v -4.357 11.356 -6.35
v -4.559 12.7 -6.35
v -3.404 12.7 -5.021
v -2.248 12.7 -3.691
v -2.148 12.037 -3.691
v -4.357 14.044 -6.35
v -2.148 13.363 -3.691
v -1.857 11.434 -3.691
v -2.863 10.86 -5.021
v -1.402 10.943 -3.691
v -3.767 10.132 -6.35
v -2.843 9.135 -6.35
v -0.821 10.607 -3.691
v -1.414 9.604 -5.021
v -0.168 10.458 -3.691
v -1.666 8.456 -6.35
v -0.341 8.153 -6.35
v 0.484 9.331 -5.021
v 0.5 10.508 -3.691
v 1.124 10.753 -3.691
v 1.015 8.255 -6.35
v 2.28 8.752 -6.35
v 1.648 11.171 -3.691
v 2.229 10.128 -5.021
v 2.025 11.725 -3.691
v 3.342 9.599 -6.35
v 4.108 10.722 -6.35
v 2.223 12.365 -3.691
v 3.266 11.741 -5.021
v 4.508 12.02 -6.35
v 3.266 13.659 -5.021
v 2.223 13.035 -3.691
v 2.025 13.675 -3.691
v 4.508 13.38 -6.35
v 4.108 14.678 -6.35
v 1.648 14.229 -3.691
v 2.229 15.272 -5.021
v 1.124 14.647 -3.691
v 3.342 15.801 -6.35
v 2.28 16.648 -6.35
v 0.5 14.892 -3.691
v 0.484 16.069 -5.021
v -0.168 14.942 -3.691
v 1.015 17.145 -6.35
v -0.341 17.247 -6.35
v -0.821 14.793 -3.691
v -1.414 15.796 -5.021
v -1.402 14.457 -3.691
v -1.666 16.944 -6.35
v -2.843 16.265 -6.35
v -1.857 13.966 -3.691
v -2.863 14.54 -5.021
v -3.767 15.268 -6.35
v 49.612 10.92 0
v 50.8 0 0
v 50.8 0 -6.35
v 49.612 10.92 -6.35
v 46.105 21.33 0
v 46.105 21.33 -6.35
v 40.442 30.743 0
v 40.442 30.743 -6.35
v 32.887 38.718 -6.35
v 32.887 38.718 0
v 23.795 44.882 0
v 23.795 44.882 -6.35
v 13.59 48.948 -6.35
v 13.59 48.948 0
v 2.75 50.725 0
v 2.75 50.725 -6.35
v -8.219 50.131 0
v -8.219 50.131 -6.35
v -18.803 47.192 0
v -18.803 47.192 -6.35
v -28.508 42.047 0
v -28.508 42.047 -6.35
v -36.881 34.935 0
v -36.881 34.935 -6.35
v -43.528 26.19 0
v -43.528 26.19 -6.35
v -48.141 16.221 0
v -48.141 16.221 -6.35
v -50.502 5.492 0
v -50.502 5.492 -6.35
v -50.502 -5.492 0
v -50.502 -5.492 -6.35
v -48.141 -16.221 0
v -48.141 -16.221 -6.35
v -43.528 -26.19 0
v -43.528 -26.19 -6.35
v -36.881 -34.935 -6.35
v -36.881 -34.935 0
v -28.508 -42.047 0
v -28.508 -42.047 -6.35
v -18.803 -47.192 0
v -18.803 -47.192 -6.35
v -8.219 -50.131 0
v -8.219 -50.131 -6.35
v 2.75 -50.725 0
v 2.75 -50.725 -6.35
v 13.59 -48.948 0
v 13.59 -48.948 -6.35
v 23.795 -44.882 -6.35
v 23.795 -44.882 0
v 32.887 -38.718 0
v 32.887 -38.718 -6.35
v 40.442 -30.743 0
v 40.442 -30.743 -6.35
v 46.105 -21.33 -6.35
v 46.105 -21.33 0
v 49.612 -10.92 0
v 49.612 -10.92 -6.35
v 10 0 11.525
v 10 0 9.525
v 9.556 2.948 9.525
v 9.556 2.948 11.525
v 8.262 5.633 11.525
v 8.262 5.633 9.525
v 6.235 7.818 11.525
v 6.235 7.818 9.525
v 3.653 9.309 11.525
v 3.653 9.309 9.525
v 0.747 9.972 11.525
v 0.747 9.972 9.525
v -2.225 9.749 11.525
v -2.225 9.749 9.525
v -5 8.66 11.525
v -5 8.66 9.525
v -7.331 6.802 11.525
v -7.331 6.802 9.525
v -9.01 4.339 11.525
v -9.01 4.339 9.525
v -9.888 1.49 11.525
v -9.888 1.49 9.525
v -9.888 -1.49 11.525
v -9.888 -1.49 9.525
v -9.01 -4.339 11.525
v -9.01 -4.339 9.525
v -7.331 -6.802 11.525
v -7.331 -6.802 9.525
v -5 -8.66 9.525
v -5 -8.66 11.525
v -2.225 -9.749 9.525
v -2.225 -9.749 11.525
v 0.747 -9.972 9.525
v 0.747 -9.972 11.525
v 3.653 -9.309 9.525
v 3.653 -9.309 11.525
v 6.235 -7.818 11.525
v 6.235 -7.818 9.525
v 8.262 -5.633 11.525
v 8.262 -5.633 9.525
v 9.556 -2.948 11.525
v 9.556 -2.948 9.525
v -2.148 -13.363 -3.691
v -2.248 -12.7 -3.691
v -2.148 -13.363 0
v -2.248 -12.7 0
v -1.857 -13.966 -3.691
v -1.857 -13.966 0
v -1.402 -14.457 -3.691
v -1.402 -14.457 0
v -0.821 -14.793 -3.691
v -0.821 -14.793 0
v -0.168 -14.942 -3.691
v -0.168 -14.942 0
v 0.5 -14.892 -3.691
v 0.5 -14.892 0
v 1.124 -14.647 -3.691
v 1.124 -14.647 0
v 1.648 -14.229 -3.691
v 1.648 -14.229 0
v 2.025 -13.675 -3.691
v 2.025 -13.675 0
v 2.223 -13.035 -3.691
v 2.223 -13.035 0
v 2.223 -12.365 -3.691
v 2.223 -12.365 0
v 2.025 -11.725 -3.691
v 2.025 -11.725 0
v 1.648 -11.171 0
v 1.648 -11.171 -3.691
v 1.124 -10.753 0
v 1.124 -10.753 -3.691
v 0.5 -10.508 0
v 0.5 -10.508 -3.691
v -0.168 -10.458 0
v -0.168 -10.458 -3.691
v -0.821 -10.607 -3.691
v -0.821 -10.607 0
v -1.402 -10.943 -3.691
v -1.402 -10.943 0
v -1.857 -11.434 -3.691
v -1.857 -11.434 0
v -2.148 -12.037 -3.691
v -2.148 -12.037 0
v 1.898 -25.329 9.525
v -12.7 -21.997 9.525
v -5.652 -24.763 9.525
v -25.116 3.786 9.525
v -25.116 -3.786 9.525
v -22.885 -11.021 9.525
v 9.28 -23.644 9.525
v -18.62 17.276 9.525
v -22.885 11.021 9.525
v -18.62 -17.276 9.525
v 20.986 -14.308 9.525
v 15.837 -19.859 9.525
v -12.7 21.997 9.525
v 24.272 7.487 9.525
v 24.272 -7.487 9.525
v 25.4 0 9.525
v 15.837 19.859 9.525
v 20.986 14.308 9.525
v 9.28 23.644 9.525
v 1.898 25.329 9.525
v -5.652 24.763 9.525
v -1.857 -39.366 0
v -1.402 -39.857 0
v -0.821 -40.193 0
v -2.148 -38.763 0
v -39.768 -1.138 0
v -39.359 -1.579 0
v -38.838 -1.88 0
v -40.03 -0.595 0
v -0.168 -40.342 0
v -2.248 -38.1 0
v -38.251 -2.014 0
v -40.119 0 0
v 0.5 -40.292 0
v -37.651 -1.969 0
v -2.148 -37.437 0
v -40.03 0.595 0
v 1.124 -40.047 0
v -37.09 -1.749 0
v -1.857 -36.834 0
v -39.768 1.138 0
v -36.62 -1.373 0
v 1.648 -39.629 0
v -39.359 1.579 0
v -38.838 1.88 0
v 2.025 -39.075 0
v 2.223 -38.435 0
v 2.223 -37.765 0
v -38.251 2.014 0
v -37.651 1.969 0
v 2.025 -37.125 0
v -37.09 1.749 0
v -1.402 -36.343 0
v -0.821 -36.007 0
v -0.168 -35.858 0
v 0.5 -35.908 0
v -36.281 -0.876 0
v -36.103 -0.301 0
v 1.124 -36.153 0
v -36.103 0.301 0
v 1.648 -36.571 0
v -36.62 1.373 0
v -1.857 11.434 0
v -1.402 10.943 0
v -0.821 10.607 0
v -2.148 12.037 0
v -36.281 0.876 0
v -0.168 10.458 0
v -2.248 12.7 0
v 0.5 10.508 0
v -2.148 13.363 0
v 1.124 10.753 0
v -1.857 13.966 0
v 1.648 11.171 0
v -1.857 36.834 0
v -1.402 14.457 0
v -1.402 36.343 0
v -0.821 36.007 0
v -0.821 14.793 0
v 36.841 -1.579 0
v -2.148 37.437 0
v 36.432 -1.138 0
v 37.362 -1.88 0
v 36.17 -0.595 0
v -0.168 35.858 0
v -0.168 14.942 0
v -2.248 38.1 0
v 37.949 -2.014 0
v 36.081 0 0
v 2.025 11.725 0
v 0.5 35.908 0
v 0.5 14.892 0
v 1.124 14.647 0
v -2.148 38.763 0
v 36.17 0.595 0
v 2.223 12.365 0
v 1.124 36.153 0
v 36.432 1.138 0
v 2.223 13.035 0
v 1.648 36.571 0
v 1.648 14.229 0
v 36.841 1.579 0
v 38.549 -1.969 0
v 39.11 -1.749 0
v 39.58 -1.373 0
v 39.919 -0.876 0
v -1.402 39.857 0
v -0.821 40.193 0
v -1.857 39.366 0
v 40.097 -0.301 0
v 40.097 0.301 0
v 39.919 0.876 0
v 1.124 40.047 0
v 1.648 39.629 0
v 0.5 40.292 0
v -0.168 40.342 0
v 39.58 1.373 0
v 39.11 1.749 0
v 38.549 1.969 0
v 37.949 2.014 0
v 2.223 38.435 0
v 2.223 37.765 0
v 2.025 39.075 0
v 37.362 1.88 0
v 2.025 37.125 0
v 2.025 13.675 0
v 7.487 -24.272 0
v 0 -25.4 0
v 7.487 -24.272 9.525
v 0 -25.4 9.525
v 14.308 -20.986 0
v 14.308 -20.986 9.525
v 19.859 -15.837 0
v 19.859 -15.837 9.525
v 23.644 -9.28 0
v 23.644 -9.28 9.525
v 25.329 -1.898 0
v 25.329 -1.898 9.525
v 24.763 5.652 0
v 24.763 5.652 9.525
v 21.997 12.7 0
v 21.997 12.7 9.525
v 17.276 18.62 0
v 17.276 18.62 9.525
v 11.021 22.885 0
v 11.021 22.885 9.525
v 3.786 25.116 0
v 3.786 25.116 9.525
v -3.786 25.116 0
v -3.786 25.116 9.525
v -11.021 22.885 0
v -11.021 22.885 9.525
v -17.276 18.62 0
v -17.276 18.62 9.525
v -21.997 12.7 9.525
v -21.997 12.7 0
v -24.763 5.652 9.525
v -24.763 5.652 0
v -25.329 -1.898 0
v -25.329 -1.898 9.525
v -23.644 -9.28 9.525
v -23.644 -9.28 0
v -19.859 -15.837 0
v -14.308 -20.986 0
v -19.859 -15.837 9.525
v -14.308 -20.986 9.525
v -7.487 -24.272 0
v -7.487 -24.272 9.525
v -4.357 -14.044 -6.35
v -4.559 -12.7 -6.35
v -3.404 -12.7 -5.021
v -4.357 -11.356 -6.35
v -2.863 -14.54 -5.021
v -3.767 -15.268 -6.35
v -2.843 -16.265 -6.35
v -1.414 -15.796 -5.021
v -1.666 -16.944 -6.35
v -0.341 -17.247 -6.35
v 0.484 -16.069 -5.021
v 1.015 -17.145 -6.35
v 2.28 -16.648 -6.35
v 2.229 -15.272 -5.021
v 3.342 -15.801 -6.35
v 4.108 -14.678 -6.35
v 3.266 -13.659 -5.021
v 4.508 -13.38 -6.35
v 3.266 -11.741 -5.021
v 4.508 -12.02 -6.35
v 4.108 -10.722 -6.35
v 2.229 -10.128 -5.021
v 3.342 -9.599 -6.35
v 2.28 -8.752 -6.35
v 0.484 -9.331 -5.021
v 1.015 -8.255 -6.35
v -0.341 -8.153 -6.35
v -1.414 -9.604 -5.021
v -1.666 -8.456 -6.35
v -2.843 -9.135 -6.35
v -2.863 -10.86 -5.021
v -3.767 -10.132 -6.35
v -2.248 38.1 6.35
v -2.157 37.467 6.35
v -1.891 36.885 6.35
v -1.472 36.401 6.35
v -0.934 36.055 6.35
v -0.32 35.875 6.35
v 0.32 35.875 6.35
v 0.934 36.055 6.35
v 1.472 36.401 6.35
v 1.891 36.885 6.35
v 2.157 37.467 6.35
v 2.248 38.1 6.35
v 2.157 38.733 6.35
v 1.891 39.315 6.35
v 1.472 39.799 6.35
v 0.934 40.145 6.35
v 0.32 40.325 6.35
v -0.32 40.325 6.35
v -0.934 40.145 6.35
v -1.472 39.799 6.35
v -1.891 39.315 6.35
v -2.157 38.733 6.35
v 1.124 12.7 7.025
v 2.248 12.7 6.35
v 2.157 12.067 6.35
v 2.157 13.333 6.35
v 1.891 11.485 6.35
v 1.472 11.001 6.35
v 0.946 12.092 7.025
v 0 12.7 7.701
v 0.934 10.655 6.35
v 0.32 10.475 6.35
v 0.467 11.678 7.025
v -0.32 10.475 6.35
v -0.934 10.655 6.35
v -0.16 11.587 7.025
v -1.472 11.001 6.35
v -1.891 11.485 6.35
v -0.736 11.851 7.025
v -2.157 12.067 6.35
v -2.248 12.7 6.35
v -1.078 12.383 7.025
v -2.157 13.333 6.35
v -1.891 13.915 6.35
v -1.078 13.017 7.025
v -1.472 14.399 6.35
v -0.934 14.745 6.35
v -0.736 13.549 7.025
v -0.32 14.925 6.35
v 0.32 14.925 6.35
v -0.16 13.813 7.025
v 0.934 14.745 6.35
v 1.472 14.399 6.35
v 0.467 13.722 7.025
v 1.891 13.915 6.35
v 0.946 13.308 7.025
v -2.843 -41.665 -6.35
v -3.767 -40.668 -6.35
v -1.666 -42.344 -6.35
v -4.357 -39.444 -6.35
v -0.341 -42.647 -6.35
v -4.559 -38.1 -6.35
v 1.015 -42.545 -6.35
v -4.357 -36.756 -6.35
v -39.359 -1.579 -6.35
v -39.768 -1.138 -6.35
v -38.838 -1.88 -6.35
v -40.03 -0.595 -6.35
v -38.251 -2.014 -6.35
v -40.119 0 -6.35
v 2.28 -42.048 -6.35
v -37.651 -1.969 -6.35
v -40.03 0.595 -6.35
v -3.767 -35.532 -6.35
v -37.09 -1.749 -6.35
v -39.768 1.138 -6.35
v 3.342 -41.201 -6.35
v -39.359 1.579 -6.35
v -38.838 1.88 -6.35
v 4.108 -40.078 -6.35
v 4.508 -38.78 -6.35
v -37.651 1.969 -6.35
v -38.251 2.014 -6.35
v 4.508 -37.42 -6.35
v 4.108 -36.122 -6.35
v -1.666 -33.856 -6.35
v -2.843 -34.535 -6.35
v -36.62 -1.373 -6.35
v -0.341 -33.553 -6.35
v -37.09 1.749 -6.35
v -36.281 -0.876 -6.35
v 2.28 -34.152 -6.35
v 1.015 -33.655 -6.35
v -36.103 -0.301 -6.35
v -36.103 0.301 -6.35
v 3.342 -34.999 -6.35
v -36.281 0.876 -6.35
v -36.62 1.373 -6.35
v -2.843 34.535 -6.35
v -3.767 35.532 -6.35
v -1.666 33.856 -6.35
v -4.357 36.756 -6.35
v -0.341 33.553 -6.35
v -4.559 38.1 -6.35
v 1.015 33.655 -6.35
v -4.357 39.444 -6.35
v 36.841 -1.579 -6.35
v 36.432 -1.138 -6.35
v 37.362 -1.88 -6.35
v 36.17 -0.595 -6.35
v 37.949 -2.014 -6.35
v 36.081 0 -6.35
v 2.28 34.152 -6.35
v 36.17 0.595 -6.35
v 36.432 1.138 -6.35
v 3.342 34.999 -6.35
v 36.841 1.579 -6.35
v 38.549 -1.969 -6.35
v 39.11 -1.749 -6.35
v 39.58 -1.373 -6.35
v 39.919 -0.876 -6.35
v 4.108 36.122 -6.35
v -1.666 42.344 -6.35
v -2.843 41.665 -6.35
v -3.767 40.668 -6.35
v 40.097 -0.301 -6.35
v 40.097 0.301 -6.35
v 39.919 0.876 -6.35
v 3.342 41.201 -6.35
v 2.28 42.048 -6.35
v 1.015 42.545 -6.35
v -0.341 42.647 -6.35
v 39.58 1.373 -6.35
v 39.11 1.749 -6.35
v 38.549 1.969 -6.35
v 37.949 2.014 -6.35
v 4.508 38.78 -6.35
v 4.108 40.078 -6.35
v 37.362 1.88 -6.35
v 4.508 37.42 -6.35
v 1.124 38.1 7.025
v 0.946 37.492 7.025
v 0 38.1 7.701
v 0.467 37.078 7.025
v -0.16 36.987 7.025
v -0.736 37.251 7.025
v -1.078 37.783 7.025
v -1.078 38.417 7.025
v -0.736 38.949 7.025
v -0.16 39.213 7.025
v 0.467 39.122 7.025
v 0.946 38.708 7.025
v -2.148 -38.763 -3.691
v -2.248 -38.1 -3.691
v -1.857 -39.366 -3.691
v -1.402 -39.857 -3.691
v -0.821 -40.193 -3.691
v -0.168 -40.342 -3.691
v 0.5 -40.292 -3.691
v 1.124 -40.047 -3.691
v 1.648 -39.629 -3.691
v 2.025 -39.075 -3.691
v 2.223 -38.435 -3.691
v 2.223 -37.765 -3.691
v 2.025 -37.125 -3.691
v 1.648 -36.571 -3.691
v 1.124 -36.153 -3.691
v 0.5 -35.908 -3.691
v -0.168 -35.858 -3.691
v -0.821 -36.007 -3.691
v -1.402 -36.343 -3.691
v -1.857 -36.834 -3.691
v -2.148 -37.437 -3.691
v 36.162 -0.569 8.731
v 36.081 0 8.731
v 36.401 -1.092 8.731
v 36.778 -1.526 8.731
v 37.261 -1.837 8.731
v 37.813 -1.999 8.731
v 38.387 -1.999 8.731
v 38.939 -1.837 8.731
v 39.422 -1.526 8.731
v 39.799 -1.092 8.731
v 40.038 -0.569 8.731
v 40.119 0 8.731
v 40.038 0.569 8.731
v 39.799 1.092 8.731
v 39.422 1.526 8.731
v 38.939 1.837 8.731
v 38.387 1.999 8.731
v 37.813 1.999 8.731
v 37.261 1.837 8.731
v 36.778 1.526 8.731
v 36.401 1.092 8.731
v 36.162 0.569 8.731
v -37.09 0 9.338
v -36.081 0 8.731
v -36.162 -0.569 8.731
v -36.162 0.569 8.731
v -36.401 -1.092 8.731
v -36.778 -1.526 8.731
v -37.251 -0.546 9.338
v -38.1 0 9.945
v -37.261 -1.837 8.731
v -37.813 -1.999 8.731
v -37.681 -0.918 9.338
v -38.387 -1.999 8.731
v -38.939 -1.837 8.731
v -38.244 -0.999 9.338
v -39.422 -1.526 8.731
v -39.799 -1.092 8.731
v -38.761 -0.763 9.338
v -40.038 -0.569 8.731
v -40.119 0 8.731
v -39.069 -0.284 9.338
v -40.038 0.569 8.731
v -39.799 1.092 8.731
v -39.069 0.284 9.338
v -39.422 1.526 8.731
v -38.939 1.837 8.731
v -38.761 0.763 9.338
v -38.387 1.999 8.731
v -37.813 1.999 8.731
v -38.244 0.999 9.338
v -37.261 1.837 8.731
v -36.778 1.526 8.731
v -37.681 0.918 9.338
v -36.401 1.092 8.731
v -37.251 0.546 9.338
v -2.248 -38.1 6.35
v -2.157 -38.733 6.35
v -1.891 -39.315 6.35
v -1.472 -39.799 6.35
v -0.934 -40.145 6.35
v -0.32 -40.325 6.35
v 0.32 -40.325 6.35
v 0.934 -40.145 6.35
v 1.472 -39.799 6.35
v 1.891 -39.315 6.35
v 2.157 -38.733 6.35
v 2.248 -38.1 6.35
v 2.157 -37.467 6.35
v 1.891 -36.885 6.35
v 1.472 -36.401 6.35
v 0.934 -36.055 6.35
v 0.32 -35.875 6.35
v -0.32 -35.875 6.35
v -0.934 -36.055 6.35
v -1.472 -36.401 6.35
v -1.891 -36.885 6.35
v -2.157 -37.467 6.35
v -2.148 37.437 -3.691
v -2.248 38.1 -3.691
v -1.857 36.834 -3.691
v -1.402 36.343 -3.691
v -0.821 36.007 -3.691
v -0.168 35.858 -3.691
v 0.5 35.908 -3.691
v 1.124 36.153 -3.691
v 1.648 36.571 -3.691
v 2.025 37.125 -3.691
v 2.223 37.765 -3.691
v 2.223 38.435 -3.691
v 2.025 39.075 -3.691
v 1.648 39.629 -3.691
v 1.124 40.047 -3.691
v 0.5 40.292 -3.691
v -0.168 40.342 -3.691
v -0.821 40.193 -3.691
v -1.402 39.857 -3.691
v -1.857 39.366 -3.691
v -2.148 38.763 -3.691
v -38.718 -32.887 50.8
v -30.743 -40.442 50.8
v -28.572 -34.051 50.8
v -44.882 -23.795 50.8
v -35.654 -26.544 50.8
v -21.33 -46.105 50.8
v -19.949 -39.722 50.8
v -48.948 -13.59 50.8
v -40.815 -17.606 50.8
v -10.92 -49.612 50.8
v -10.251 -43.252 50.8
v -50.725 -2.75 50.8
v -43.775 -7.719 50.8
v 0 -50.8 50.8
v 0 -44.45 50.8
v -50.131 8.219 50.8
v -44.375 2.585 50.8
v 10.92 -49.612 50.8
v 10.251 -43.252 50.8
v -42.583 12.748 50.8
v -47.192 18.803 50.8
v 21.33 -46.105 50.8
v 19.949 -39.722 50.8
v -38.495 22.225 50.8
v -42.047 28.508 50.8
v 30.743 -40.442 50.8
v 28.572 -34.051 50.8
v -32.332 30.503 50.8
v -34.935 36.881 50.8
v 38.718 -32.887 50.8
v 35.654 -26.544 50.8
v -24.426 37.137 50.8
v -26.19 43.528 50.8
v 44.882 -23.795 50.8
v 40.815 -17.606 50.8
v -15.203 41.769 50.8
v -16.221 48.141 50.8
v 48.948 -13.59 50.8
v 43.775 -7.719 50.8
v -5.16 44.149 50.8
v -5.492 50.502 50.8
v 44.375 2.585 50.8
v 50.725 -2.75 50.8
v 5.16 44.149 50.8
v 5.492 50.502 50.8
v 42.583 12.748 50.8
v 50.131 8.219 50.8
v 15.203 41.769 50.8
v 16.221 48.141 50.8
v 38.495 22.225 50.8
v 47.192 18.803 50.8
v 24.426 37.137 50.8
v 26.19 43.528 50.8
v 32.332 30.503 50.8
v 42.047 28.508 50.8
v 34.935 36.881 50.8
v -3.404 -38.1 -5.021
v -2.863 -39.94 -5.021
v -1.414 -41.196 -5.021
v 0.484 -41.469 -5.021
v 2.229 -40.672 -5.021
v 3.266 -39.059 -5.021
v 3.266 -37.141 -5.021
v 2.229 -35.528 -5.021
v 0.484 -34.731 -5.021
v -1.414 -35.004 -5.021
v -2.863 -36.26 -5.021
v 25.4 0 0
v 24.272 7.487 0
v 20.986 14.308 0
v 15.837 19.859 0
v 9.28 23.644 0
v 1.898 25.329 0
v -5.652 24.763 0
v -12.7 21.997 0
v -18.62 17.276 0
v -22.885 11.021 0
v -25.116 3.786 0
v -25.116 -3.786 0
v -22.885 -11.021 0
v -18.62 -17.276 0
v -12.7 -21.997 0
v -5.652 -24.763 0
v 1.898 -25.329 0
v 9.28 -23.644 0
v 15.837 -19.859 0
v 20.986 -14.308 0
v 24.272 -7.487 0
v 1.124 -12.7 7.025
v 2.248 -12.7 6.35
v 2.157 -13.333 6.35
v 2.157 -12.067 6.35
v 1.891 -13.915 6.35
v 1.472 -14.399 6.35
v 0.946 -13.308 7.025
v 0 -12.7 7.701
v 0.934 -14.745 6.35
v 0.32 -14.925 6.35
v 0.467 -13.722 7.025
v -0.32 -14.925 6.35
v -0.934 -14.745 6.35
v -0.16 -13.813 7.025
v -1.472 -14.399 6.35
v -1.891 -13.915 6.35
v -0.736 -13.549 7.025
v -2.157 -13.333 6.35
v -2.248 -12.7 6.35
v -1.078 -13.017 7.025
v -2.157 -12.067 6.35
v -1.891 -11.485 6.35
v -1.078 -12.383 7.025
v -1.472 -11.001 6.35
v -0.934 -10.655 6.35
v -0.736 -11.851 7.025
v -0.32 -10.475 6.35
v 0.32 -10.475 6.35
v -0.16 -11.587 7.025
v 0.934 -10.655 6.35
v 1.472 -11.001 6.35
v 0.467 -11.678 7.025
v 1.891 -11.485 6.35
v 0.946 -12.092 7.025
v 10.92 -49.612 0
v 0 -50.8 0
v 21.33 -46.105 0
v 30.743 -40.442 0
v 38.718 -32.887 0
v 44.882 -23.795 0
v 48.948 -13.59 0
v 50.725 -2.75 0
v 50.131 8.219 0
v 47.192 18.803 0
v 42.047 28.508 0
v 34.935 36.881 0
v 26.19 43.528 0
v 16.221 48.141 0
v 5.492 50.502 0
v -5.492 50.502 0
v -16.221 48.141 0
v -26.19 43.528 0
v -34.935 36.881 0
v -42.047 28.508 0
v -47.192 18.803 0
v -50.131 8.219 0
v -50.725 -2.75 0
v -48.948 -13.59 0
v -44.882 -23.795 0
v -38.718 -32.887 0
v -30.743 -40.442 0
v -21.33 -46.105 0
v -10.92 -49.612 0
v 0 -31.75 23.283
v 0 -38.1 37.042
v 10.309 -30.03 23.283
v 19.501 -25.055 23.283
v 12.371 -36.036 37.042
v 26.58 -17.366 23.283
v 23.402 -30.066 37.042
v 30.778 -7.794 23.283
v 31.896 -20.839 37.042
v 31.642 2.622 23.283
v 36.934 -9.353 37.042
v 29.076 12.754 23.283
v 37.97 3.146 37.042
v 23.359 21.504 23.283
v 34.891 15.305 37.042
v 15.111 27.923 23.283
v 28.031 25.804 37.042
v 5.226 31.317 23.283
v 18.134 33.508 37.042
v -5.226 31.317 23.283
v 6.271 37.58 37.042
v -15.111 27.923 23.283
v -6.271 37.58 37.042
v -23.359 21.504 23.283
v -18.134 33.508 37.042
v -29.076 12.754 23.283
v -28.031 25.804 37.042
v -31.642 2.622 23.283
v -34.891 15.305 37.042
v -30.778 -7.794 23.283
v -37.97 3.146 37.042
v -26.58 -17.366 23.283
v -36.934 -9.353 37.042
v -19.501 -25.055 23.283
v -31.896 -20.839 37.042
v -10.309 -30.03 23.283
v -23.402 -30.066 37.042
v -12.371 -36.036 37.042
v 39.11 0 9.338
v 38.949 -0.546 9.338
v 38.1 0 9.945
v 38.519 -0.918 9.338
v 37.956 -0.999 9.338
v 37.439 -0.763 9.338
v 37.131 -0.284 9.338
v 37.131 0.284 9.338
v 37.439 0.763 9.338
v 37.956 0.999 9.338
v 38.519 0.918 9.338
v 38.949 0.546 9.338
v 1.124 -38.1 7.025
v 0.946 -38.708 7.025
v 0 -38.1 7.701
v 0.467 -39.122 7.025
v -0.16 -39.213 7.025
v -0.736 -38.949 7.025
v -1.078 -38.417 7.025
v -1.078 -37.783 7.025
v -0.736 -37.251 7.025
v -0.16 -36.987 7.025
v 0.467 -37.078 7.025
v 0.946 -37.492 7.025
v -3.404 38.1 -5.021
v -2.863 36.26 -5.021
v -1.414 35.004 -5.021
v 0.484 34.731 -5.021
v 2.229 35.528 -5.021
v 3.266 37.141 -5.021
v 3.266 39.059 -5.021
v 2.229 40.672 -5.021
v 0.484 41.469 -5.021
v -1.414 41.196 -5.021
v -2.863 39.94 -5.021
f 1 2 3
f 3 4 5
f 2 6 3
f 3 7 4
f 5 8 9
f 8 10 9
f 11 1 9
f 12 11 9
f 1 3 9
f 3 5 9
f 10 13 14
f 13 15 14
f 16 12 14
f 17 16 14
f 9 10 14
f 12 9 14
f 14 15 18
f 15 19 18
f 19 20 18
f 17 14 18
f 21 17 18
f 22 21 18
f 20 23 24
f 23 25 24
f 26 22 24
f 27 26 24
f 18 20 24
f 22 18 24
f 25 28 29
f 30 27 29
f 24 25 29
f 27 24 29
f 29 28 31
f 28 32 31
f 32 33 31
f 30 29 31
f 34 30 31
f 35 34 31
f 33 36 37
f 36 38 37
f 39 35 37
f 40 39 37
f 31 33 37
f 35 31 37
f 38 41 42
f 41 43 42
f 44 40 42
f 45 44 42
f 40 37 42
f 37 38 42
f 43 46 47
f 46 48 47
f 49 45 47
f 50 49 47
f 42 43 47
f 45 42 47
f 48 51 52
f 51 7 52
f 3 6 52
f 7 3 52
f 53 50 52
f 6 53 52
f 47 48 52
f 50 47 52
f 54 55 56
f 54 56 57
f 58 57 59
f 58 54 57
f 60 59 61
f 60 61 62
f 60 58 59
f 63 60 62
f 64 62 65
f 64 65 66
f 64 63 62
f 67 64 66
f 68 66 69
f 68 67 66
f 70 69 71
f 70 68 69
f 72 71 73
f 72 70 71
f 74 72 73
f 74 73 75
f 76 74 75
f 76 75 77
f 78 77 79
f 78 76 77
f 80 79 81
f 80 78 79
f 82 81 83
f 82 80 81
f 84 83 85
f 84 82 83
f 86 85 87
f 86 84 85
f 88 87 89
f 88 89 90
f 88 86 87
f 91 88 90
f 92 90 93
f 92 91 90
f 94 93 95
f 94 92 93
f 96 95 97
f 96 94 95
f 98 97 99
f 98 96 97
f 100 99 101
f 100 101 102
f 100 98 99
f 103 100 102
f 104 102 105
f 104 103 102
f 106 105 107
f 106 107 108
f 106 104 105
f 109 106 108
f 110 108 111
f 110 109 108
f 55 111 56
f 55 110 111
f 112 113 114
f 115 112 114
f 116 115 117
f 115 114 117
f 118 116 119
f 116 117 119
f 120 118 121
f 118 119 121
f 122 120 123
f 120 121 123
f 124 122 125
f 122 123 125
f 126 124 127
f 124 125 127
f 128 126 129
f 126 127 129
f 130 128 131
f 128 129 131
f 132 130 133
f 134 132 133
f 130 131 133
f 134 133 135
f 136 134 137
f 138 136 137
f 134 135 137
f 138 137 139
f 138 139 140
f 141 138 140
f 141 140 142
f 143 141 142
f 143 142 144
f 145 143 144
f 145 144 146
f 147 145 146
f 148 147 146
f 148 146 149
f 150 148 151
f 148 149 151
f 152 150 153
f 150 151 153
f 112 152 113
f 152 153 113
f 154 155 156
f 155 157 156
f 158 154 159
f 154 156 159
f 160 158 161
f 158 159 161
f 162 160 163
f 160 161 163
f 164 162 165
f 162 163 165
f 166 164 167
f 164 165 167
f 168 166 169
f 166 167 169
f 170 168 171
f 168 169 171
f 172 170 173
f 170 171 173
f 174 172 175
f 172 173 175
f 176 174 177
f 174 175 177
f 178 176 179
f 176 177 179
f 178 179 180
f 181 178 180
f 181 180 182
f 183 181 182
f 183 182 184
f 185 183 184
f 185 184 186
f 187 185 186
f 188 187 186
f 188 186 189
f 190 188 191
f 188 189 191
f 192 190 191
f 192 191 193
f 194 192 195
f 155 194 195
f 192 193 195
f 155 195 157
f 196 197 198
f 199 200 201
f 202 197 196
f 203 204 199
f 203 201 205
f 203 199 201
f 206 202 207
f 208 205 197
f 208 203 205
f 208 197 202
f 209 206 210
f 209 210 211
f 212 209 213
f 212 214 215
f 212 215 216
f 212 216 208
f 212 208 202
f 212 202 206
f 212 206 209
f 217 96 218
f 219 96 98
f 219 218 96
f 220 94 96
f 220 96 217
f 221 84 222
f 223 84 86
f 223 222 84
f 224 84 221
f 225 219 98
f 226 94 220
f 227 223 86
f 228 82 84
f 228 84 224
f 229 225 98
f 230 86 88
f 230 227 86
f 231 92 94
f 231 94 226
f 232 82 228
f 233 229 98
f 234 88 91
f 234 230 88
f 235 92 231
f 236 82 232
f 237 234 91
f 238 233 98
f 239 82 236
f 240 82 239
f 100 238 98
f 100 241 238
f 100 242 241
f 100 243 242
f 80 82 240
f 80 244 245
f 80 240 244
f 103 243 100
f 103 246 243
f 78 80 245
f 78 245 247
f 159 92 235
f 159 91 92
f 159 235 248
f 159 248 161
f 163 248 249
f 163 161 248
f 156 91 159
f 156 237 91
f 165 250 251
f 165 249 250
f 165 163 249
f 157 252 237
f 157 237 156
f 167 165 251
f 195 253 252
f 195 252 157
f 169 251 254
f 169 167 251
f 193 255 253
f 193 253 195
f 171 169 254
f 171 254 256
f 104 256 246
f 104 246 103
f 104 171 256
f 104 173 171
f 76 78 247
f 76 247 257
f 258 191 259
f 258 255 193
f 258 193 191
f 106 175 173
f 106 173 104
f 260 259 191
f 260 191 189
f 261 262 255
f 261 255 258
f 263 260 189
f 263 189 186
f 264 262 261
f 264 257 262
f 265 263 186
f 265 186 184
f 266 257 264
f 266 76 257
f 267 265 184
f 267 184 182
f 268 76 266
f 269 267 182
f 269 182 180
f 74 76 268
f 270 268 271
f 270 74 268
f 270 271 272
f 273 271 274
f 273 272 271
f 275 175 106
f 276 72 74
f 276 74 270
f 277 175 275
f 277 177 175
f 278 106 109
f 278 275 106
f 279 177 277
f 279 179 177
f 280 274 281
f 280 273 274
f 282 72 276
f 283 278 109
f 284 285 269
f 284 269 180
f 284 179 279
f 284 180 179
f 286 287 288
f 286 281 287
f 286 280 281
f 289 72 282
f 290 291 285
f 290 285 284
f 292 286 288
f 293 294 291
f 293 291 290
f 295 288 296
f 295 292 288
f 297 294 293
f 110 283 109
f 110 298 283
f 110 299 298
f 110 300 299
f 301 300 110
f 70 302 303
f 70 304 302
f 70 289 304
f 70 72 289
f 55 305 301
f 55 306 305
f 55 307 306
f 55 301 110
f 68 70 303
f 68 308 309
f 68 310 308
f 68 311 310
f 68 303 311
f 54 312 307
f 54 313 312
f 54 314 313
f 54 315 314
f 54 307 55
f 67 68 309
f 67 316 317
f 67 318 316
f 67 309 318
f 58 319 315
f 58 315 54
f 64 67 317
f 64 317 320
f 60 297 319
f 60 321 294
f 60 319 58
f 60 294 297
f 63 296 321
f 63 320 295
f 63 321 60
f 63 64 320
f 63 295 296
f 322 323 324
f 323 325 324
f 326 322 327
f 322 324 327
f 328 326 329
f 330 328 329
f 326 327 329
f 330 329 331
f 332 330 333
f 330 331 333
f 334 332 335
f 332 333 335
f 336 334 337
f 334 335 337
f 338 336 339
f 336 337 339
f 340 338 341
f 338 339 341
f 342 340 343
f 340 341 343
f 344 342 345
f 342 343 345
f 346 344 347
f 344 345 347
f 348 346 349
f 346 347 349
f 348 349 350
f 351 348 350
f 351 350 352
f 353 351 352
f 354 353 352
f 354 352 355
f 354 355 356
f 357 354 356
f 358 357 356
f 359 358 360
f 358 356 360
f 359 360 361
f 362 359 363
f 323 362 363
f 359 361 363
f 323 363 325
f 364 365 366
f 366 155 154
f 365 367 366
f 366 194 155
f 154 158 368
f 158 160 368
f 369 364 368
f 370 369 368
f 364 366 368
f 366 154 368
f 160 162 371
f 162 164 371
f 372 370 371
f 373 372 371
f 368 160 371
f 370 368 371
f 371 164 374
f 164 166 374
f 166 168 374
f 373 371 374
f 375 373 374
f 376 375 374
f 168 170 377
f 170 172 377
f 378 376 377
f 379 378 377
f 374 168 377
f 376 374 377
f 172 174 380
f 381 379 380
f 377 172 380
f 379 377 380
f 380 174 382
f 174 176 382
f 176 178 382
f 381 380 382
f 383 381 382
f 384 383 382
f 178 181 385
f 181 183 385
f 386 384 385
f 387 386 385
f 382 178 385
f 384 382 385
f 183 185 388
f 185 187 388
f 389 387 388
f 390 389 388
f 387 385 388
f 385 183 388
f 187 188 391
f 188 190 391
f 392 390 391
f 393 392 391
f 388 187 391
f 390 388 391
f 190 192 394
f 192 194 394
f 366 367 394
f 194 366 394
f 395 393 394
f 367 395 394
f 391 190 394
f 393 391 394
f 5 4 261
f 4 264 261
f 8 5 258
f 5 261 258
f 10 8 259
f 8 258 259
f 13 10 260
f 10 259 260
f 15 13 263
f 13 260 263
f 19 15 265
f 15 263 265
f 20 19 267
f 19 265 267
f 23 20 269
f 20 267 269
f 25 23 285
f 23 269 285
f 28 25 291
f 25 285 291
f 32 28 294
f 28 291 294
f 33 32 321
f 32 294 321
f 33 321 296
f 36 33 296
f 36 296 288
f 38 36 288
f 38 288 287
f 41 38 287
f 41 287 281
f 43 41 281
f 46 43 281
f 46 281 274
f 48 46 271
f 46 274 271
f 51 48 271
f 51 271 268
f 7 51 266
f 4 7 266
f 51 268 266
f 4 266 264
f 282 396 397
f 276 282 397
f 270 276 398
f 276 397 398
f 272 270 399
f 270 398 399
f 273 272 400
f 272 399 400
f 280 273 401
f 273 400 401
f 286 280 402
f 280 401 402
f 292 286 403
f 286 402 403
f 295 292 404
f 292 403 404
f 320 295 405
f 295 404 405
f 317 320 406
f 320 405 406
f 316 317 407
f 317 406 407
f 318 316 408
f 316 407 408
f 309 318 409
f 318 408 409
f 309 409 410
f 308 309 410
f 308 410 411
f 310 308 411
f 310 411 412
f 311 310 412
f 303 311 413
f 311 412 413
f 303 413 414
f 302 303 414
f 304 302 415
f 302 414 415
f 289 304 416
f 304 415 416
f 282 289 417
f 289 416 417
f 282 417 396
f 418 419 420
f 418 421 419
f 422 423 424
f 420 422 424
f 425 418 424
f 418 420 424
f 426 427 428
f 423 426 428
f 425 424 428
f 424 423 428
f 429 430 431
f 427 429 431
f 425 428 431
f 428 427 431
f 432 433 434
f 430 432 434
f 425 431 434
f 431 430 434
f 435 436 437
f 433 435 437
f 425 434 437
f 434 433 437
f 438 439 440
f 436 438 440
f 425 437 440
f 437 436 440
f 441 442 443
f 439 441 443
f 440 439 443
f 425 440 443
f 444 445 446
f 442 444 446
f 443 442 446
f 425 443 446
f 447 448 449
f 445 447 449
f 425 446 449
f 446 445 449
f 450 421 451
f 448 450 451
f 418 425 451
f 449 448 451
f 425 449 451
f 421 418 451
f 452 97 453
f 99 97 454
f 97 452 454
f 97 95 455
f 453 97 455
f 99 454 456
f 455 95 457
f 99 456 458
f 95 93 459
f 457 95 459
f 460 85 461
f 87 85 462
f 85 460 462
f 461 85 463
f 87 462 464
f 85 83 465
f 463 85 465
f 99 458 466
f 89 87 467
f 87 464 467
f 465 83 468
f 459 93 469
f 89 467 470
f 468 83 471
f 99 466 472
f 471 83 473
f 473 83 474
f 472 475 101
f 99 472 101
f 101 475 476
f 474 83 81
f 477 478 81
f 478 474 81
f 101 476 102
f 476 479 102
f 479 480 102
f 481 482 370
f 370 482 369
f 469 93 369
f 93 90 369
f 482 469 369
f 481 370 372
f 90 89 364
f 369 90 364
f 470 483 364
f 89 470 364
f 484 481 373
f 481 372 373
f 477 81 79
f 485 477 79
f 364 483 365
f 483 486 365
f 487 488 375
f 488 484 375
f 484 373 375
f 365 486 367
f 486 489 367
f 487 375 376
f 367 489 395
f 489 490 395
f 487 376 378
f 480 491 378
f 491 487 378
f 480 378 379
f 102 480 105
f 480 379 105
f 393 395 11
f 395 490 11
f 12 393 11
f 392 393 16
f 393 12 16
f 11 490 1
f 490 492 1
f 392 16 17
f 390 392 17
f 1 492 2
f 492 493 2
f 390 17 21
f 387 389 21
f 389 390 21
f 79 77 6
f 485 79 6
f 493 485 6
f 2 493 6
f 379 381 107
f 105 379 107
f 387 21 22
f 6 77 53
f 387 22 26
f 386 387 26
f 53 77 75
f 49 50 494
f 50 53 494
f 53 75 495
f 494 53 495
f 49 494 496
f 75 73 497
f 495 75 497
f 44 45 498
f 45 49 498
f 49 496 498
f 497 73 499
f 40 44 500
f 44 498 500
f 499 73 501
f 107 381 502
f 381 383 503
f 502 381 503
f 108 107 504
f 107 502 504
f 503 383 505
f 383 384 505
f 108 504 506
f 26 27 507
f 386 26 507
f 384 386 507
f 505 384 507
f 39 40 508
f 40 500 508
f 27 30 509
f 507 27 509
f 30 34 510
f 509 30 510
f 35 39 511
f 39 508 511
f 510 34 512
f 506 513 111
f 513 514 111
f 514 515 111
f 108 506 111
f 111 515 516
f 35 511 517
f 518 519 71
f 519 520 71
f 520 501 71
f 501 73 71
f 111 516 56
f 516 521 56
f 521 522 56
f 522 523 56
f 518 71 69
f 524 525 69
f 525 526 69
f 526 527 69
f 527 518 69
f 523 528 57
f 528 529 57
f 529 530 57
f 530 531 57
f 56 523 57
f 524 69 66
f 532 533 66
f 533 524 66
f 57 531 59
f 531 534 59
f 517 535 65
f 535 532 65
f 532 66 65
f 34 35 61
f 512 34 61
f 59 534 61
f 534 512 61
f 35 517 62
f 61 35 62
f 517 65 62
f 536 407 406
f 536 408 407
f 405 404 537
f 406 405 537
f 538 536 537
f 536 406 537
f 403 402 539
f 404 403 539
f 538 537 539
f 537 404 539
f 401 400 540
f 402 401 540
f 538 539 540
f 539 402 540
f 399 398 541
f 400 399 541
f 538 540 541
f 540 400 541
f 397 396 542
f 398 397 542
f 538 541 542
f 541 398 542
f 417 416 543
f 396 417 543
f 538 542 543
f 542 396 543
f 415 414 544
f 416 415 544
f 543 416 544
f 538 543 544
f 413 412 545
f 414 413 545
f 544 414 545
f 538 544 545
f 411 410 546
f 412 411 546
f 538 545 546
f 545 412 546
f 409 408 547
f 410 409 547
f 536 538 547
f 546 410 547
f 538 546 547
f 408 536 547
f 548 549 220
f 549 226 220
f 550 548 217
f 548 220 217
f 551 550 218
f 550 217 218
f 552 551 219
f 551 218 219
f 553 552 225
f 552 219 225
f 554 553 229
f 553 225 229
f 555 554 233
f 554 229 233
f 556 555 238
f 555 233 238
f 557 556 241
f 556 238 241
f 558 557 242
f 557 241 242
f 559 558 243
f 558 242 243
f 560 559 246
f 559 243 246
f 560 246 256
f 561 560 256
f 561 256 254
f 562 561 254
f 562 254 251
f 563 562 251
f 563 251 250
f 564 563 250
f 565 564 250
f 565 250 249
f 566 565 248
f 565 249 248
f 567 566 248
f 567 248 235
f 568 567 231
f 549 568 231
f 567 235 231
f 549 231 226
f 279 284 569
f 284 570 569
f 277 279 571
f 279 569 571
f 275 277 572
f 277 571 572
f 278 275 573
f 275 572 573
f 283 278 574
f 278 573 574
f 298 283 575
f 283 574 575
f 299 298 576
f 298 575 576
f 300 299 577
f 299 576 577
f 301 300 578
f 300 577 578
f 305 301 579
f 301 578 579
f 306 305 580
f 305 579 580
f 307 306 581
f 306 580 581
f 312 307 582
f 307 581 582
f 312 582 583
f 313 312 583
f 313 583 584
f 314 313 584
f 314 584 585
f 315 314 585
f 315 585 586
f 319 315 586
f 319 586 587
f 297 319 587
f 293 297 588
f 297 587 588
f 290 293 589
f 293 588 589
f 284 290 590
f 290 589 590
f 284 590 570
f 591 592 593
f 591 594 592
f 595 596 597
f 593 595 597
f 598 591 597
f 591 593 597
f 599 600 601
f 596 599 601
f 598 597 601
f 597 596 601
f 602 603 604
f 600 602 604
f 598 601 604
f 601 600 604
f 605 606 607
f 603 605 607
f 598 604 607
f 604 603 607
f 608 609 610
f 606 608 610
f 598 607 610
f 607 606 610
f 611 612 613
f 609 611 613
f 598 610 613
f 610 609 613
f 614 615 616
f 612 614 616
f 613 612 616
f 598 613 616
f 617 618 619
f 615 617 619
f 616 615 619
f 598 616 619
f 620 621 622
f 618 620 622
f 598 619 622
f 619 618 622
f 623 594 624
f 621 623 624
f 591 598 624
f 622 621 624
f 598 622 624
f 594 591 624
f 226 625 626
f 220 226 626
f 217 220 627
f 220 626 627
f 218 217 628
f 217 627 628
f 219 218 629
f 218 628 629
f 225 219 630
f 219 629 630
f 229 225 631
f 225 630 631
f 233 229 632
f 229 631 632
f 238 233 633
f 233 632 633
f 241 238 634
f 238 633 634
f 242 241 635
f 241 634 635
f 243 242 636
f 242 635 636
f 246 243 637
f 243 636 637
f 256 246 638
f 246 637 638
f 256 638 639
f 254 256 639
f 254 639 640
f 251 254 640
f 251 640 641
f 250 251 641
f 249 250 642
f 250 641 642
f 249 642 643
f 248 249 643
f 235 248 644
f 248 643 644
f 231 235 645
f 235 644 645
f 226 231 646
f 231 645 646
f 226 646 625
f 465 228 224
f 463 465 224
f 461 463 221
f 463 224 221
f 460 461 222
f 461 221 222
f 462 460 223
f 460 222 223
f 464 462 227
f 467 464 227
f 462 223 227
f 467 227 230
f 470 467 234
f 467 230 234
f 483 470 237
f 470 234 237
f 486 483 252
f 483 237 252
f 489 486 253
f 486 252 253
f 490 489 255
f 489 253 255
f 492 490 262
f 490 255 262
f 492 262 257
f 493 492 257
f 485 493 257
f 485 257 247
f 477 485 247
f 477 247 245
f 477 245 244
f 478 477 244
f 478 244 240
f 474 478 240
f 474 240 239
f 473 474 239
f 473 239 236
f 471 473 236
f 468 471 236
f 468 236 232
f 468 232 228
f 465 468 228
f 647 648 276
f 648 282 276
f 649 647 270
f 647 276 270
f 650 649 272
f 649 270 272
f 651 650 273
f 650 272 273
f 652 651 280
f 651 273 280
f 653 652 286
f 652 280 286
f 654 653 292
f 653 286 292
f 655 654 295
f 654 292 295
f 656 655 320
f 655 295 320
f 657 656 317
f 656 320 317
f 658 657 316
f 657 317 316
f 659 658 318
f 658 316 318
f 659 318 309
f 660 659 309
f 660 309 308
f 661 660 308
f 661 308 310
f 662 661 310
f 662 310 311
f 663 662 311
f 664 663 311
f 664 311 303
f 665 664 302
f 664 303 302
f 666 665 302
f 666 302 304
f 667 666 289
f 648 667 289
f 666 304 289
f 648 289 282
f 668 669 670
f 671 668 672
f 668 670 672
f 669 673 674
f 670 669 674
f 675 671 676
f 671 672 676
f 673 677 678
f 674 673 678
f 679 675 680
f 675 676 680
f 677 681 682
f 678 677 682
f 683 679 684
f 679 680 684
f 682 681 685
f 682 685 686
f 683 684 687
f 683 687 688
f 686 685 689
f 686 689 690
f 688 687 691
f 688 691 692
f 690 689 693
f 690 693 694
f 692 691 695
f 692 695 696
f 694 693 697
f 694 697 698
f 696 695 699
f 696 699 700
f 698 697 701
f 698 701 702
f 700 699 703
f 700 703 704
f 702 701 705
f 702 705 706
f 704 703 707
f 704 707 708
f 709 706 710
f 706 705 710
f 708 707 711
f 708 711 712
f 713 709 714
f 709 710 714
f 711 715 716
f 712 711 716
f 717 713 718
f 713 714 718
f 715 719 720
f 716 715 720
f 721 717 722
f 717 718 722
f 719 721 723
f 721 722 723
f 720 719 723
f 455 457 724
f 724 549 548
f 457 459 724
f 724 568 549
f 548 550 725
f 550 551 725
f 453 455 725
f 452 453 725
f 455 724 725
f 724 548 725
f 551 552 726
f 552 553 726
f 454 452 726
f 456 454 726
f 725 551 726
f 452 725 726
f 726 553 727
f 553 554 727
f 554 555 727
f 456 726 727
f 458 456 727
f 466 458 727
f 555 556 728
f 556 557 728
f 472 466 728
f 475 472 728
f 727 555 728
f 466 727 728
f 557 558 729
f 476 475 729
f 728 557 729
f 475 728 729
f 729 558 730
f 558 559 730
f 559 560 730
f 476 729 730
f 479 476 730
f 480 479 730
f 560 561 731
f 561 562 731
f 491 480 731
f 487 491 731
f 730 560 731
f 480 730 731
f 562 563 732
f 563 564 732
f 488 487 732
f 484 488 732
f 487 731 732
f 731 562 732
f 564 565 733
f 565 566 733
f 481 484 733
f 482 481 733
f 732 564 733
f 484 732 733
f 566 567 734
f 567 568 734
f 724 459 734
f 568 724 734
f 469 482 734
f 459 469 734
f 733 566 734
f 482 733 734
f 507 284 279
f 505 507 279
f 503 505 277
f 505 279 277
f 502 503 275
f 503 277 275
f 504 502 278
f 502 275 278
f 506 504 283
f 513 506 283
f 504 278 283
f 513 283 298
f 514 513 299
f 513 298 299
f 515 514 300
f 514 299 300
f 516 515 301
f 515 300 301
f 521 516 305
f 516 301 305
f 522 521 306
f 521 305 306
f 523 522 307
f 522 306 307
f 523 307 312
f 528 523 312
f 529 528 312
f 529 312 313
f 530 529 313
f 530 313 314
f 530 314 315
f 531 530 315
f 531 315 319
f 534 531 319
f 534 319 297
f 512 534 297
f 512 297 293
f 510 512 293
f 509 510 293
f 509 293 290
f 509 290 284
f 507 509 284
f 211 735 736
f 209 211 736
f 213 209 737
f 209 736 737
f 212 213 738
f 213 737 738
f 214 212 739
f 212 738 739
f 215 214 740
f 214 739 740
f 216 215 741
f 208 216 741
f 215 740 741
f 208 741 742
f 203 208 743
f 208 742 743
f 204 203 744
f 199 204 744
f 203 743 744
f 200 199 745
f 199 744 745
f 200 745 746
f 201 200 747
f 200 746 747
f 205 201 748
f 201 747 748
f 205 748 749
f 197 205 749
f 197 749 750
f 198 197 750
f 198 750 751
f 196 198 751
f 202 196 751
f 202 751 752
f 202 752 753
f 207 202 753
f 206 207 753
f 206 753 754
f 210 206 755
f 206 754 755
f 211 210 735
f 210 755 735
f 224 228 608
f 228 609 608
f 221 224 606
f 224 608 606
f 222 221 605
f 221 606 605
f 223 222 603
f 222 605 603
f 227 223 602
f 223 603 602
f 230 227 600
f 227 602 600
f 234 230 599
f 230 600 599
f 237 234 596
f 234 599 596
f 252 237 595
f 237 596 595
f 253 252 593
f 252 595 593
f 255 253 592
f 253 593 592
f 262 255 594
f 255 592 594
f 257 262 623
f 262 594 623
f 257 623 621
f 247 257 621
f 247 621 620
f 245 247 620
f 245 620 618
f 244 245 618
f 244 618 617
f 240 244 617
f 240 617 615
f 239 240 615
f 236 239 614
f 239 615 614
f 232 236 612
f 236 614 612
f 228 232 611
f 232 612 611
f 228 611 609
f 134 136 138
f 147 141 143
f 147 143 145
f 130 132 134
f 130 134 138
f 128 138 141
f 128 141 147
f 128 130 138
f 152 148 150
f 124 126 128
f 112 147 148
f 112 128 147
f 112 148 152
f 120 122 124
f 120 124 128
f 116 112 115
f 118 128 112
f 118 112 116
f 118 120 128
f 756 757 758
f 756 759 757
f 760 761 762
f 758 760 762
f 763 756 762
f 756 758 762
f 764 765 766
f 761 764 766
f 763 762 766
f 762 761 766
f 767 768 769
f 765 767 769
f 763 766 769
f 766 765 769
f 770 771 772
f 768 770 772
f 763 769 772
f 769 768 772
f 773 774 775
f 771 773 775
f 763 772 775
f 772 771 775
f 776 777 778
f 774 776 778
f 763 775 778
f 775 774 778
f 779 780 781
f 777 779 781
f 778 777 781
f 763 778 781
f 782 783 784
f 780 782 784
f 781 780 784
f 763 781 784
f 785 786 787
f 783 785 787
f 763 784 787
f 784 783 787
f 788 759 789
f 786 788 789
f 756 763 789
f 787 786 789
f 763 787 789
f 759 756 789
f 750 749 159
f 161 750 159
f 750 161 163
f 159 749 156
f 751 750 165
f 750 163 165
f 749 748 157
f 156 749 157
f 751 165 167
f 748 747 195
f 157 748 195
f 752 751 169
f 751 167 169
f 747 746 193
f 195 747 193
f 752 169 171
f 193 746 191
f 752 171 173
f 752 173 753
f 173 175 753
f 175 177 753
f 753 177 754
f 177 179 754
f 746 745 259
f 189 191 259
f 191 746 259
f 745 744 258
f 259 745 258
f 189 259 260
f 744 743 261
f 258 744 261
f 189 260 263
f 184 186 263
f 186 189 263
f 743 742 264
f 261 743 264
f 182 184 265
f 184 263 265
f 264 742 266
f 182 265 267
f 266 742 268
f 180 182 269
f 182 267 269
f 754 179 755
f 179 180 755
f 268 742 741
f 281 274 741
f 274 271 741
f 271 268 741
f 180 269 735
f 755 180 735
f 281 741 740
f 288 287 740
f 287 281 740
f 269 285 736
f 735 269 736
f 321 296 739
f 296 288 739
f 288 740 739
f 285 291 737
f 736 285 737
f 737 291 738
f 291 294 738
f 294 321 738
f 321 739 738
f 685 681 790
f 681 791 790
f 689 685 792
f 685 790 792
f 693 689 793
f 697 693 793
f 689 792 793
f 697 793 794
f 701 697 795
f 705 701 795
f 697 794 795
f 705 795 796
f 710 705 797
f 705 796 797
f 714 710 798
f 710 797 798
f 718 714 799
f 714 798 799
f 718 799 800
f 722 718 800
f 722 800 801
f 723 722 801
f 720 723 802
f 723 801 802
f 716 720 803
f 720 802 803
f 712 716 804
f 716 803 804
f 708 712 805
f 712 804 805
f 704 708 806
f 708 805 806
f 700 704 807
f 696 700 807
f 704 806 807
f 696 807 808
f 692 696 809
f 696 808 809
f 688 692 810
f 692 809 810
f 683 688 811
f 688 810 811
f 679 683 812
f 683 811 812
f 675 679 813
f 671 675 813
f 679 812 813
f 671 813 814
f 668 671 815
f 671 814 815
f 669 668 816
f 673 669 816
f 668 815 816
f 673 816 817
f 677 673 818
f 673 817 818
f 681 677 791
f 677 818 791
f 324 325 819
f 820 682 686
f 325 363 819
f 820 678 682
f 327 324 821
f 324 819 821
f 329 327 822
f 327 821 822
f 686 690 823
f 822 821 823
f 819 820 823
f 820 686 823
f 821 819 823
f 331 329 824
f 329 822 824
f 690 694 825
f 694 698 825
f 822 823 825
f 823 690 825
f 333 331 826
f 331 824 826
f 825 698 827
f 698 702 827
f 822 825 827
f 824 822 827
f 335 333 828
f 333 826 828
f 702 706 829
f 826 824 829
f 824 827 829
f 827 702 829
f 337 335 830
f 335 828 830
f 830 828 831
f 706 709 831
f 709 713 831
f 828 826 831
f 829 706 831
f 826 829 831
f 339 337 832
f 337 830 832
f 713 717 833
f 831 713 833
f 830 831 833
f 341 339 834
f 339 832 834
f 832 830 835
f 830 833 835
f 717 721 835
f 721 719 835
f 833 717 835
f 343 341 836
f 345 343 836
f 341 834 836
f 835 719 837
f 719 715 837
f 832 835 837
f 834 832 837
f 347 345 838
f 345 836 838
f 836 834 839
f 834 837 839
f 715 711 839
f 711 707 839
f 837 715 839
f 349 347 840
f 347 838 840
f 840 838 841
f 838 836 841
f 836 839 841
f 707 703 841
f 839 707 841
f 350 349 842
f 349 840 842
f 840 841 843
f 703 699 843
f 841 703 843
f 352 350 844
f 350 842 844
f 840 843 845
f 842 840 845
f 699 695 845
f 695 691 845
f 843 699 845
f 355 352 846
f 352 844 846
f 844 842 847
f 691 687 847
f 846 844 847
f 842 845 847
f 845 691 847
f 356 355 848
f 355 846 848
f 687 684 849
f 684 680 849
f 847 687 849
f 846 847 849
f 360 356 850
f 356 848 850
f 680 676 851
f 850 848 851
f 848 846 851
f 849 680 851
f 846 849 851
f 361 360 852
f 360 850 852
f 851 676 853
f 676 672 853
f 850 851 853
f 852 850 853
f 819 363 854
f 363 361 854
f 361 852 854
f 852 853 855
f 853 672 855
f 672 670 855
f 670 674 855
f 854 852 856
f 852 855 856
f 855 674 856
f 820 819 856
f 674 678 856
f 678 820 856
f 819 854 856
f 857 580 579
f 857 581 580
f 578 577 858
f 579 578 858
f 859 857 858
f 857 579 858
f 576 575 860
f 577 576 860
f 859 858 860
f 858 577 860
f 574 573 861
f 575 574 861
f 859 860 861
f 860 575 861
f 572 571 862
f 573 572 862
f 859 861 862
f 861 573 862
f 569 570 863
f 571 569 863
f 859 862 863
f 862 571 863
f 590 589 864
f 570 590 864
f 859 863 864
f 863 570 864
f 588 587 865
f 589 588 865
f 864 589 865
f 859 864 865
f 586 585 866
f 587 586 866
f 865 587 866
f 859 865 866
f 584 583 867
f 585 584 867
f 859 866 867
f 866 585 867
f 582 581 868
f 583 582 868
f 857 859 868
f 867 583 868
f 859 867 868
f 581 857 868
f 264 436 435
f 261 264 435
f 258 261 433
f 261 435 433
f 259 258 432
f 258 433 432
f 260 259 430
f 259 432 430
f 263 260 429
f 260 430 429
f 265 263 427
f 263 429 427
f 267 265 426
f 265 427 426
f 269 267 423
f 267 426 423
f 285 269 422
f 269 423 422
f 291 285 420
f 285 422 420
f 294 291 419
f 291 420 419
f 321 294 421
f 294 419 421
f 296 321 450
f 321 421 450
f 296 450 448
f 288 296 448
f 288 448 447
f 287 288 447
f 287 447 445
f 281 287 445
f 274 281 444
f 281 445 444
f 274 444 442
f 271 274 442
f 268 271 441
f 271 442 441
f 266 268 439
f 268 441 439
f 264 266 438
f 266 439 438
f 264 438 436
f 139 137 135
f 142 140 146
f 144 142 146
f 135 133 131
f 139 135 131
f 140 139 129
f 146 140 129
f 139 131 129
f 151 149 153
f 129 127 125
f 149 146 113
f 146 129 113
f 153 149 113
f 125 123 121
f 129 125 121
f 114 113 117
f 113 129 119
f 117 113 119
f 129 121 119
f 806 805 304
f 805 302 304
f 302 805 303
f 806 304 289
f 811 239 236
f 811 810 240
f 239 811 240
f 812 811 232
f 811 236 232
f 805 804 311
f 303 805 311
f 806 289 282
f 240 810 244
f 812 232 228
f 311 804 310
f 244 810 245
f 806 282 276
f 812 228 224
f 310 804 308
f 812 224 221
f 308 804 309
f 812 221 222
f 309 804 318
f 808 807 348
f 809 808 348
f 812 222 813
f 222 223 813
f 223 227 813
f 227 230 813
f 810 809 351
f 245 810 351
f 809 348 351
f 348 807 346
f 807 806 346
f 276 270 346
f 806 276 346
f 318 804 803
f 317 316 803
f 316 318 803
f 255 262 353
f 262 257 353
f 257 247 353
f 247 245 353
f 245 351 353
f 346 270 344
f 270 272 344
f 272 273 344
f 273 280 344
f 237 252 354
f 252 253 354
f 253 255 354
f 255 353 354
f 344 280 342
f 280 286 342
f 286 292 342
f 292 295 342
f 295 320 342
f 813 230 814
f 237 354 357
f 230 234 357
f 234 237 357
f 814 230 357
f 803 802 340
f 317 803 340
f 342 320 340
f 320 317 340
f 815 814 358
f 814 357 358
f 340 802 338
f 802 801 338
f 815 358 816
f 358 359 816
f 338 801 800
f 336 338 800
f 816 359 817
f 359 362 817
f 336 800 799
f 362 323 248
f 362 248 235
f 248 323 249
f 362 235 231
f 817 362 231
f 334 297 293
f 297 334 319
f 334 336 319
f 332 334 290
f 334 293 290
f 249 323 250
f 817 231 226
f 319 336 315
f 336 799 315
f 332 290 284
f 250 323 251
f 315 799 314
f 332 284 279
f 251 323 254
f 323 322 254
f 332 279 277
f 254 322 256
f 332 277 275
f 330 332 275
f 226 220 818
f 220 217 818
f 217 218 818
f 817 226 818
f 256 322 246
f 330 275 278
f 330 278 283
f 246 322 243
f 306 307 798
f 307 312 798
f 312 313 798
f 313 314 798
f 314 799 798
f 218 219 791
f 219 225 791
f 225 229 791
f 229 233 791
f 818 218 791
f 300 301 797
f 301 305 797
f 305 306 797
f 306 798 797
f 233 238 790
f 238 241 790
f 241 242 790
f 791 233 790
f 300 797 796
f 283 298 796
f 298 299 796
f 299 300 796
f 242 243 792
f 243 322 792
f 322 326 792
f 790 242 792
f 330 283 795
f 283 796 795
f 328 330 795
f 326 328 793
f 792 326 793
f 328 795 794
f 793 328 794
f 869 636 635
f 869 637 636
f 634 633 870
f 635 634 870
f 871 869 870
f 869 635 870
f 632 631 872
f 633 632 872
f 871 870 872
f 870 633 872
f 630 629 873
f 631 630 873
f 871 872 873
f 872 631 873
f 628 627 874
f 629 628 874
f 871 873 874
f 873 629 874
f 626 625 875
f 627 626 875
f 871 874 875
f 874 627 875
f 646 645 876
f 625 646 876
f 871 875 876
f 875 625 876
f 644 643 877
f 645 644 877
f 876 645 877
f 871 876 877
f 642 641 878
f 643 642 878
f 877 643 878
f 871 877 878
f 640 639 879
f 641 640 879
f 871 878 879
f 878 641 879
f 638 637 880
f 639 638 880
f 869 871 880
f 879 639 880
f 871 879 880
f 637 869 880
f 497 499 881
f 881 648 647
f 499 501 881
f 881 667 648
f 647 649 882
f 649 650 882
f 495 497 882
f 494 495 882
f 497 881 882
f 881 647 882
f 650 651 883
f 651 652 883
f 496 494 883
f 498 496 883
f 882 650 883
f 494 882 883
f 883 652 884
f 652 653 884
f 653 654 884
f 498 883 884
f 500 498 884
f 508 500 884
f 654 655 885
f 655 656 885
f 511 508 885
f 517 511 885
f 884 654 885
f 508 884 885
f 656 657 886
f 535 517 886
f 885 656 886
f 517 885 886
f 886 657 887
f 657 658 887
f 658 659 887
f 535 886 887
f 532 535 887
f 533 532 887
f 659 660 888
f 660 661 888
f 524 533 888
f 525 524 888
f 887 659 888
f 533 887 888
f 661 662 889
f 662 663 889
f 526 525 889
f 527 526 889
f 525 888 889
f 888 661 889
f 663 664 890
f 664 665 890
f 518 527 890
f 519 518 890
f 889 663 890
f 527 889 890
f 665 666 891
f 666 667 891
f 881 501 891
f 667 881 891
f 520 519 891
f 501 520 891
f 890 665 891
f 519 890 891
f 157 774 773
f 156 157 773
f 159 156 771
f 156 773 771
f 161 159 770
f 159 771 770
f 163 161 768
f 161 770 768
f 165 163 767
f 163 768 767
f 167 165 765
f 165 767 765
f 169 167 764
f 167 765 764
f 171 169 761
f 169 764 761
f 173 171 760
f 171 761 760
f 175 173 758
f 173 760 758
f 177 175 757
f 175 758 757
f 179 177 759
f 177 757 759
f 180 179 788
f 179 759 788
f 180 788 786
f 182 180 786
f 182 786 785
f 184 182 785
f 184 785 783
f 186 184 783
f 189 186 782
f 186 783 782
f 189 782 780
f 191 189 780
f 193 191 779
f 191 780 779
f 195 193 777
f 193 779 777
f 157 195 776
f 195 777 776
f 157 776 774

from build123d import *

# Parameters (mm, degrees)
F0_R              = 25.4
F1_DEPTH          = 9.525
F2_R              = 10
F3_DEPTH          = 2
F7_R              = 50.8
F8_DEPTH          = 6.35
F10_D             = 4.4958
F10_DEPTH         = 12.7
F10_CSINK_D       = 9.1186
F10_CSINK_ANGLE   = 82
F10_TIP           = 1.3506745855
F10_2_D           = 4.4958
F10_2_DEPTH       = 12.7
F10_2_CSINK_D     = 9.1186
F10_2_CSINK_ANGLE = 82
F10_2_TIP         = 1.3506745855
F10_3_D           = 4.4958
F10_3_DEPTH       = 12.7
F10_3_CSINK_D     = 9.1186
F10_3_CSINK_ANGLE = 82
F10_3_TIP         = 1.3506745855
F11_D             = 4.0386
F11_DEPTH         = 15.08125
F11_TIP           = 1.213317848
F11_2_D           = 4.0386
F11_2_DEPTH       = 15.08125
F11_2_TIP         = 1.213317848


# Not quite as in the source:
# - a length typed as a fraction of an inch, garbled in the dataset ("3 / 203.2 mm" for 3/8 in), is restored


with BuildPart() as f1:
    # F0 (on Top) → F1 (new body)
    with BuildSketch(Plane.XY):
        Circle(F0_R)
    extrude(amount=F1_DEPTH)

    # F10
    with Locations(Plane(origin=(0, 0, -6.35), x_dir=(1, 0, 0), z_dir=(0, 0, -1))):
        with Locations((0, 38.1), (0, 12.7), (0, -12.7), (0, -38.1)):
            CounterSinkHole(F10_D / 2, F10_CSINK_D / 2, depth=F10_DEPTH, counter_sink_angle=F10_CSINK_ANGLE)
            with Locations((0, 0, -(F10_DEPTH + F10_TIP / 2))):  # 118° drill point
                Cone(0, F10_D / 2, F10_TIP, mode=Mode.SUBTRACT)


with BuildPart() as f3:
    # F2 (on face) → F3 (new body)
    with BuildSketch(Plane.XY.offset(9.525)):
        Circle(F2_R)
    extrude(amount=F3_DEPTH)


with BuildPart() as f6:
    # F5 (on Right) → F6 (revolve)
    with BuildSketch(Plane.YZ):
        Polygon((-50.8, 0), (-25.4, 0), (-25.4, 9.525), (-44.45, 50.8), (-50.8, 50.8), align=None)
    revolve(axis=Axis((0, 0, 35.1485721767), (0, 0, 1)))

    # F10#2
    with Locations(Plane(origin=(0, 0, -6.35), x_dir=(1, 0, 0), z_dir=(0, 0, -1))):
        with Locations((0, 38.1), (0, 12.7), (0, -12.7), (0, -38.1)):
            CounterSinkHole(F10_2_D / 2, F10_2_CSINK_D / 2, depth=F10_2_DEPTH, counter_sink_angle=F10_2_CSINK_ANGLE)
            with Locations((0, 0, -(F10_2_DEPTH + F10_2_TIP / 2))):  # 118° drill point
                Cone(0, F10_2_D / 2, F10_2_TIP, mode=Mode.SUBTRACT)

    # F11
    with Locations(Plane(origin=(0, 0, -6.35), x_dir=(1, 0, 0), z_dir=(0, 0, -1))):
        with Locations((38.1, 0), (-38.1, 0)):
            Hole(F11_D / 2, depth=F11_DEPTH)
            with Locations((0, 0, -(F11_DEPTH + F11_TIP / 2))):  # 118° drill point
                Cone(0, F11_D / 2, F11_TIP, mode=Mode.SUBTRACT)


with BuildPart() as f8:
    # F7 (on face) → F8 (new body)
    with BuildSketch(Plane.XY):
        Circle(F7_R)
    extrude(amount=-F8_DEPTH)

    # F10#3
    with Locations(Plane(origin=(0, 0, -6.35), x_dir=(1, 0, 0), z_dir=(0, 0, -1))):
        with Locations((0, 38.1), (0, 12.7), (0, -12.7), (0, -38.1)):
            CounterSinkHole(F10_3_D / 2, F10_3_CSINK_D / 2, depth=F10_3_DEPTH, counter_sink_angle=F10_3_CSINK_ANGLE)
            with Locations((0, 0, -(F10_3_DEPTH + F10_3_TIP / 2))):  # 118° drill point
                Cone(0, F10_3_D / 2, F10_3_TIP, mode=Mode.SUBTRACT)

    # F11#2
    with Locations(Plane(origin=(0, 0, -6.35), x_dir=(1, 0, 0), z_dir=(0, 0, -1))):
        with Locations((38.1, 0), (-38.1, 0)):
            Hole(F11_2_D / 2, depth=F11_2_DEPTH)
            with Locations((0, 0, -(F11_2_DEPTH + F11_2_TIP / 2))):  # 118° drill point
                Cone(0, F11_2_D / 2, F11_2_TIP, mode=Mode.SUBTRACT)


solid = Compound([f1.part, f3.part, f6.part, f8.part])
